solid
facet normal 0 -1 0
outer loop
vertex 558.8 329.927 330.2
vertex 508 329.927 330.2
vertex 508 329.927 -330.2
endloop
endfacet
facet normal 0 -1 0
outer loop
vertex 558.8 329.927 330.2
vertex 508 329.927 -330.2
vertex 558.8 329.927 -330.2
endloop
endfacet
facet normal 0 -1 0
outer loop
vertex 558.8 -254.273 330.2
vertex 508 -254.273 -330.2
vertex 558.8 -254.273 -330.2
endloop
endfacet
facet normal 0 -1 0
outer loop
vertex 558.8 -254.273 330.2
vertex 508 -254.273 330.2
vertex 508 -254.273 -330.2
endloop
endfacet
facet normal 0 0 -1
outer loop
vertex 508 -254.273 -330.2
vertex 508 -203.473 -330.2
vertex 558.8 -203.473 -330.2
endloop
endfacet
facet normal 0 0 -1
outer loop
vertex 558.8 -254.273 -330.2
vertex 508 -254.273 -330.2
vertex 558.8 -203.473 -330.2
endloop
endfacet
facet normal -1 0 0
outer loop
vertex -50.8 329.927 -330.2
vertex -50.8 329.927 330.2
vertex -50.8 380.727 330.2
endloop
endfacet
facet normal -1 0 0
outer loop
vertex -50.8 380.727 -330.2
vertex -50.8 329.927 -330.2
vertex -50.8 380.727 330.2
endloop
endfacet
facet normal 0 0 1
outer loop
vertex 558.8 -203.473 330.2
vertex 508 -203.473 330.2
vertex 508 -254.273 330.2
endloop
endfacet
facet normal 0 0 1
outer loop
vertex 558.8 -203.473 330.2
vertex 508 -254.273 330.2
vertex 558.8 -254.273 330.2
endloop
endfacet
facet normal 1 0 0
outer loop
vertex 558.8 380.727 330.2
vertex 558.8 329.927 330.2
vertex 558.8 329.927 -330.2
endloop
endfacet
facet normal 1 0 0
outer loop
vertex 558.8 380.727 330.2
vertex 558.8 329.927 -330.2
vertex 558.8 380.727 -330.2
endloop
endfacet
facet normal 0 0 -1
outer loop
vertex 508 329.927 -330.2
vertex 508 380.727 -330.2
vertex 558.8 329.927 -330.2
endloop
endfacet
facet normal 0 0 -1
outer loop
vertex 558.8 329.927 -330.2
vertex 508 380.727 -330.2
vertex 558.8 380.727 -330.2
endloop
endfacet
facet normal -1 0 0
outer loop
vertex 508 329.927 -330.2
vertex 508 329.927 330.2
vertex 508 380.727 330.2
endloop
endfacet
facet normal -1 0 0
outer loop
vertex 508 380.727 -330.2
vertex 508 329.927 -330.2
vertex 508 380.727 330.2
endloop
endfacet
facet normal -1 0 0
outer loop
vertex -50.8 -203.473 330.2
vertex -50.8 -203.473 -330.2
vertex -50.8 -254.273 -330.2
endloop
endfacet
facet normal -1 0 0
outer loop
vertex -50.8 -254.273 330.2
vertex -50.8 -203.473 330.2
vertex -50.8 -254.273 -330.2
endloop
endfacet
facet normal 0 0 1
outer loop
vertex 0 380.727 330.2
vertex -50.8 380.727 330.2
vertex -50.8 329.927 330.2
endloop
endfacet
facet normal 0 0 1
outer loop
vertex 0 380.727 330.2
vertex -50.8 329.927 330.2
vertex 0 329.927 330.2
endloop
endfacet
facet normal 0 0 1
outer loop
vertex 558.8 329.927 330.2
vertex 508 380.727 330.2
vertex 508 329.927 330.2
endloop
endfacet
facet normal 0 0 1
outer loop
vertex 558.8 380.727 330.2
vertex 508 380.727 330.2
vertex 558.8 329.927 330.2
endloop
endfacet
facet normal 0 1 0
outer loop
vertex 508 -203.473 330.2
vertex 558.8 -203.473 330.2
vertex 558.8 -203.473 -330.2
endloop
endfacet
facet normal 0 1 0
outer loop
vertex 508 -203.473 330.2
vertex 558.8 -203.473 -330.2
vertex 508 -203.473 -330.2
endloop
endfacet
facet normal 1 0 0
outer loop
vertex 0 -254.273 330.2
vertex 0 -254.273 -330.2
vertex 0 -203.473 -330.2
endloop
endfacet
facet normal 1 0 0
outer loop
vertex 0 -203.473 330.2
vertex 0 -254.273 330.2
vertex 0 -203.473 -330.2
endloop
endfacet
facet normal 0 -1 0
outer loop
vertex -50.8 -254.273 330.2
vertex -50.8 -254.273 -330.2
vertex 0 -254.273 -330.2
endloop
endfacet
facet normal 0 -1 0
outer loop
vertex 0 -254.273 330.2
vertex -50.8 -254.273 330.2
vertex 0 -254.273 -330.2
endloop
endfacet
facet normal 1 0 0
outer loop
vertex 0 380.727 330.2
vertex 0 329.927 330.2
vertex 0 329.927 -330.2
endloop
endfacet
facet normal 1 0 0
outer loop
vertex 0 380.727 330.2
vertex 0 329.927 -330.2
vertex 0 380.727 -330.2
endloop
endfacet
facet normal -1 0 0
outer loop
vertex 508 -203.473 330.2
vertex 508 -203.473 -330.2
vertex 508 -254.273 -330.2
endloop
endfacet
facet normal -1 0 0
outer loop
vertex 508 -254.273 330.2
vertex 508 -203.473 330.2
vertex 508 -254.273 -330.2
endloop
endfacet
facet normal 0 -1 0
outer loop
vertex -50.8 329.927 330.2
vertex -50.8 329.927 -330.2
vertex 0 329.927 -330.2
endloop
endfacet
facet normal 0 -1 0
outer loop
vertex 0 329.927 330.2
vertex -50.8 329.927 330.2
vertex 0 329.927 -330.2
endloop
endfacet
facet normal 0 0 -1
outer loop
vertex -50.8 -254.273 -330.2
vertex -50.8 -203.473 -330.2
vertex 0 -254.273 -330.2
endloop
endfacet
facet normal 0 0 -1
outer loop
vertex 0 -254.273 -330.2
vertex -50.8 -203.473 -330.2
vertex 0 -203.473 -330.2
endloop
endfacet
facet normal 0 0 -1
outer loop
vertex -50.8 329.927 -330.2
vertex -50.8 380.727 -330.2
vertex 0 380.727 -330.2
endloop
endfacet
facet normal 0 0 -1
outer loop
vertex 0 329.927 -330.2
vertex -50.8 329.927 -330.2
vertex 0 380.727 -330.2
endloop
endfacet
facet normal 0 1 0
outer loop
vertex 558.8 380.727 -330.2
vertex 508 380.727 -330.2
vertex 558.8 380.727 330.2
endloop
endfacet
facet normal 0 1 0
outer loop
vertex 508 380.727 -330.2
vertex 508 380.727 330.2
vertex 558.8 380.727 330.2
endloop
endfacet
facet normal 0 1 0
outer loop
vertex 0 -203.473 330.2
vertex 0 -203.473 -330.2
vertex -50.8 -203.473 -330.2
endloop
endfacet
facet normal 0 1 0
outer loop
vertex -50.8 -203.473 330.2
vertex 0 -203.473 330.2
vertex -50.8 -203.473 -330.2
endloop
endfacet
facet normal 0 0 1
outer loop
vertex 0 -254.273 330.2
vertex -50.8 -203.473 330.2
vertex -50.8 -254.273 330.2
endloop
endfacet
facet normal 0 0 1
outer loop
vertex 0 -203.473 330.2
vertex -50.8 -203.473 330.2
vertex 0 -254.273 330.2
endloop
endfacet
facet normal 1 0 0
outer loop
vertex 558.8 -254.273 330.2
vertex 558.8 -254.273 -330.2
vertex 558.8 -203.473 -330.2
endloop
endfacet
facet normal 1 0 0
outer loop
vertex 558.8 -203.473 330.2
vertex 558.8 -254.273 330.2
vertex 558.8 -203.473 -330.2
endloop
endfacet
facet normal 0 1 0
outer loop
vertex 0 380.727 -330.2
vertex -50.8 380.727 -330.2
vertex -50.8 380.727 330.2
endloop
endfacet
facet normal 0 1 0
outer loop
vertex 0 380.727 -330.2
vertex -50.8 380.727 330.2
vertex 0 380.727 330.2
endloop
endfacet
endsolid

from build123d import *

# Parameters (mm, degrees)
F0_W     = 50.8
F0_H     = 50.8
F1_DEPTH = 330.2


# Not quite as in the source:
# - a feature names something its author has since deleted; it is built from what else it names


with BuildPart() as f1:
    # F0 (on Top) → F1 (new body, symmetric)
    with BuildSketch(Plane.XY):
        with Locations((-25.4, 355.3269766333)):
            Rectangle(F0_W, F0_H)
    extrude(amount=F1_DEPTH, both=True)


with BuildPart() as f1b:
    # F0 (on Top) → F1, piece 2 (new body, symmetric)
    with BuildSketch(Plane.XY):
        Polygon((-25.4, -203.4730233667), (-50.8, -203.4730233667), (-50.8, -254.2730233667), (0, -254.2730233667), (0, -203.4730233667), align=None)
    extrude(amount=F1_DEPTH, both=True)


with BuildPart() as f1c:
    # F0 (on Top) → F1, piece 3 (new body, symmetric)
    with BuildSketch(Plane.XY):
        Polygon((558.8, -254.2730233667), (558.8, -203.4730233667), (508, -203.4730233667), (508, -228.8730233667), (508, -254.2730233667), align=None)
    extrude(amount=F1_DEPTH, both=True)


with BuildPart() as f1d:
    # F0 (on Top) → F1, piece 4 (new body, symmetric)
    with BuildSketch(Plane.XY):
        with Locations((533.4, 355.3269766333)):
            Rectangle(F0_W, F0_H)
    extrude(amount=F1_DEPTH, both=True)


solid = Compound([f1.part, f1b.part, f1c.part, f1d.part])
